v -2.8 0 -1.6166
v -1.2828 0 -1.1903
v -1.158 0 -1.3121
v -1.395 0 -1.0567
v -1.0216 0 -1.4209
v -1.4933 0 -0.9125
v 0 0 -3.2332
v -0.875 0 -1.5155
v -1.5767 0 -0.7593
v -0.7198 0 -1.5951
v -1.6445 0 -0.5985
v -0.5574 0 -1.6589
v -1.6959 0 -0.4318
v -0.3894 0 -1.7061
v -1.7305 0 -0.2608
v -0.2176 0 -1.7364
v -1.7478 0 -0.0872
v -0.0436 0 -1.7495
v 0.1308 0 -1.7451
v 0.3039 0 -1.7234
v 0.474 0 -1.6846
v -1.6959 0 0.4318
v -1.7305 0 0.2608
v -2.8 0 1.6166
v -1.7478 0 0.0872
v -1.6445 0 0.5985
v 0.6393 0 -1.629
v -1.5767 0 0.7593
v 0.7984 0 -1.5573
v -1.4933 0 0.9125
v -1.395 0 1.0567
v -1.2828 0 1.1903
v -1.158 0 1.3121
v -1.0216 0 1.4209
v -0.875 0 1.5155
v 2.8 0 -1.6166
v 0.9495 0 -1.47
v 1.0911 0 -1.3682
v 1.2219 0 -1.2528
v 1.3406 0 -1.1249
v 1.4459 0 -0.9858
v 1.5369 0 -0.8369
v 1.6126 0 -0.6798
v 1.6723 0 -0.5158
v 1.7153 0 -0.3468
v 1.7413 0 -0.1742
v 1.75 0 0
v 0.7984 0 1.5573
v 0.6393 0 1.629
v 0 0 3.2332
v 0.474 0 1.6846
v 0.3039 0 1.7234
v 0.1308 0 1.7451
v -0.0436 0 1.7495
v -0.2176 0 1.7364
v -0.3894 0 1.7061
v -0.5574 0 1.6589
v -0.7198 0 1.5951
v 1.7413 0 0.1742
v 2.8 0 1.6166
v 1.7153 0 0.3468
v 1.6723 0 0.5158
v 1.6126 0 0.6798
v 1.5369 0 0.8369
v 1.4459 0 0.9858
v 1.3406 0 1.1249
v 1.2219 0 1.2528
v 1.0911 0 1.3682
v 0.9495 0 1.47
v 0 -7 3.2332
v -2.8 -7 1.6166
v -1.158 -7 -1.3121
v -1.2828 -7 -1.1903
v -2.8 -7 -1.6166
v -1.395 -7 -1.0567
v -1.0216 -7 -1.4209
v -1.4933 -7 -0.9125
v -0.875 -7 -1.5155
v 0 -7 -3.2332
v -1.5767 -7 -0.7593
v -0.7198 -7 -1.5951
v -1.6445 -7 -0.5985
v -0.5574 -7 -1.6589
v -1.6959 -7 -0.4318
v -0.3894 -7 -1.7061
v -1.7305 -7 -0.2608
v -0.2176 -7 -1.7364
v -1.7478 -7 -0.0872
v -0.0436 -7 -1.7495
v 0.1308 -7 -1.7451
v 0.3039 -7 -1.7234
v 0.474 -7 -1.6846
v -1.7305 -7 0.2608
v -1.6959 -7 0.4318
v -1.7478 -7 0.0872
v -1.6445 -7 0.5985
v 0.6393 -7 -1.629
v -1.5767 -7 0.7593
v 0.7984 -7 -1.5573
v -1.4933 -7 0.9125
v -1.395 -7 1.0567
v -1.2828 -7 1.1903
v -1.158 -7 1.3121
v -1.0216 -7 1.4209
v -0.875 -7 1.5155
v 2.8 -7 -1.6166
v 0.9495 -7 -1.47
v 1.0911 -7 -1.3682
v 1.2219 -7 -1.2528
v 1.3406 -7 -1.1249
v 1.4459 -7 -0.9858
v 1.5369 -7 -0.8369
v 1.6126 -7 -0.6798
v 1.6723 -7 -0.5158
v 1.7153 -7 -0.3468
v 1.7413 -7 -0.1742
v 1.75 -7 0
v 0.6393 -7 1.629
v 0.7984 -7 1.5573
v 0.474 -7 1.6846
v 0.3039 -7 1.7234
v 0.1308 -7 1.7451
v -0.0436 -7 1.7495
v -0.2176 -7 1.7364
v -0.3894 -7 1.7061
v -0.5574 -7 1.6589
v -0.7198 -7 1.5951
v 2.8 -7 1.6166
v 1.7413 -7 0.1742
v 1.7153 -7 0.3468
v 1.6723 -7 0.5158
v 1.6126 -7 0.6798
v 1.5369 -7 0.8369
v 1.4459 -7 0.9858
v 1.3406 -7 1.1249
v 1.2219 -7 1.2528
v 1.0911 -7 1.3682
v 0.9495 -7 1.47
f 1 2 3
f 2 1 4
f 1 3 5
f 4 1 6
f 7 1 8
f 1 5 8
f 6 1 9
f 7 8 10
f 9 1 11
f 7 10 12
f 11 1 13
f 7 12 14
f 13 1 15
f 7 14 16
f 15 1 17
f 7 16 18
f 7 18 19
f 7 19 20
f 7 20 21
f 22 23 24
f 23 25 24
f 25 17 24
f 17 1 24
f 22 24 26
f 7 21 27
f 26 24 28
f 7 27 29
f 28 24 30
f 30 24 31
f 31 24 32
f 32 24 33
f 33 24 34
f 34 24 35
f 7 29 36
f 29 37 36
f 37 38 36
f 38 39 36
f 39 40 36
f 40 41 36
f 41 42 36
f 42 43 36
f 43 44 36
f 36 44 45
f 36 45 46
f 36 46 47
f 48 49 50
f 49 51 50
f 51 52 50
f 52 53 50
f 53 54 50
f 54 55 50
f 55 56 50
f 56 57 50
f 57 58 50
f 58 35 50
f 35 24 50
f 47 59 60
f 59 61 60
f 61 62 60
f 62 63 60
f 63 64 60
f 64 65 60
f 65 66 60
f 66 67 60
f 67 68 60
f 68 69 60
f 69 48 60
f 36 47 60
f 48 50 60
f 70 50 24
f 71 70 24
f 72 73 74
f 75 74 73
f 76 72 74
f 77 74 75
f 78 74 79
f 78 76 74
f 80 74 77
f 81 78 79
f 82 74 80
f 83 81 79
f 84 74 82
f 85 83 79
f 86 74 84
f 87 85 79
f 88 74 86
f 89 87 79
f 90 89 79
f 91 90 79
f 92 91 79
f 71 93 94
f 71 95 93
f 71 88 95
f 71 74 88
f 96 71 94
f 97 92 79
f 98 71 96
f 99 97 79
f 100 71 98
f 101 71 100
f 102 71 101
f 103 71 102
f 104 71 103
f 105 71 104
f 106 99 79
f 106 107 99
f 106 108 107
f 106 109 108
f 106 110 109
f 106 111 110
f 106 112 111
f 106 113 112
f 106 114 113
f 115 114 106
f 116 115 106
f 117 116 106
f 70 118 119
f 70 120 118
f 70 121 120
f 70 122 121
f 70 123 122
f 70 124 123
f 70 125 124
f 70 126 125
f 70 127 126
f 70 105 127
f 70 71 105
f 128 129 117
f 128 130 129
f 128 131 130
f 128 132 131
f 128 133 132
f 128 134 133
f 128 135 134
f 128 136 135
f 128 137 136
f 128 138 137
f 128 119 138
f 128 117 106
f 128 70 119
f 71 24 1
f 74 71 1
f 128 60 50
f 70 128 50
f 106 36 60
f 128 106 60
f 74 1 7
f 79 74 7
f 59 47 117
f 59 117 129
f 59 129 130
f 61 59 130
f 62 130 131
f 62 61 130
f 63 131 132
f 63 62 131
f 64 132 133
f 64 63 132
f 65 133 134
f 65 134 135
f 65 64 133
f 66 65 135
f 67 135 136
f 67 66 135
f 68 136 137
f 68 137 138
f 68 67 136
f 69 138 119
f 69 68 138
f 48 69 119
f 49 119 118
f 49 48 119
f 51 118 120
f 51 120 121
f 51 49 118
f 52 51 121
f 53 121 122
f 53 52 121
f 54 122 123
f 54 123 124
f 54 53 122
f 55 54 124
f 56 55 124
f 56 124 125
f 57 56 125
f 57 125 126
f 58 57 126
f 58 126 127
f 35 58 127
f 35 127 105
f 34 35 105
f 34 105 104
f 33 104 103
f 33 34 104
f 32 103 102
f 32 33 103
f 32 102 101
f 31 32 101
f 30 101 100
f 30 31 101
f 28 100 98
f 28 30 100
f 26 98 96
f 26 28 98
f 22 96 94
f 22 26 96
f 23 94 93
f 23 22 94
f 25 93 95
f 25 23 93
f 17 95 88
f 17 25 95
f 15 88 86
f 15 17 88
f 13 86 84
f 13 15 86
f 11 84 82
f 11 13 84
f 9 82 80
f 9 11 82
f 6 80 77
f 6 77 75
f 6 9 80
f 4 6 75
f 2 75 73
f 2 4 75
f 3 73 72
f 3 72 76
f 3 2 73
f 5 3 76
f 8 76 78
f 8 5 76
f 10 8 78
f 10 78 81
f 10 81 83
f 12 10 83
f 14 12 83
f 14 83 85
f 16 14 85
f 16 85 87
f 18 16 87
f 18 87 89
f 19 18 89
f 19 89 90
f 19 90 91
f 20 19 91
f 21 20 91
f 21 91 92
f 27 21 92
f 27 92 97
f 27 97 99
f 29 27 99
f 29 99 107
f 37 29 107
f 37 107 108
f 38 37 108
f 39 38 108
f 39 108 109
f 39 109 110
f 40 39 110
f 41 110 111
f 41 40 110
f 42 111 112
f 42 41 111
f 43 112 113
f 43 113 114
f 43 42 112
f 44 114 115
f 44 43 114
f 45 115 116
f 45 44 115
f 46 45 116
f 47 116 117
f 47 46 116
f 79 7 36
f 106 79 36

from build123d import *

# Parameters (mm, degrees)
SKETCH_R  = 1.75
PAD_DEPTH = 7


with BuildPart() as part:
    # Sketch → Pad (new body)
    with BuildSketch(Plane.XZ):
        Polygon((2.8, 1.616581), (0, 3.233162), (-2.8, 1.616581), (-2.8, -1.616581), (0, -3.233162), (2.8, -1.616581), align=None)
        Circle(SKETCH_R, mode=Mode.SUBTRACT)
    extrude(amount=PAD_DEPTH)


solid = part.part
